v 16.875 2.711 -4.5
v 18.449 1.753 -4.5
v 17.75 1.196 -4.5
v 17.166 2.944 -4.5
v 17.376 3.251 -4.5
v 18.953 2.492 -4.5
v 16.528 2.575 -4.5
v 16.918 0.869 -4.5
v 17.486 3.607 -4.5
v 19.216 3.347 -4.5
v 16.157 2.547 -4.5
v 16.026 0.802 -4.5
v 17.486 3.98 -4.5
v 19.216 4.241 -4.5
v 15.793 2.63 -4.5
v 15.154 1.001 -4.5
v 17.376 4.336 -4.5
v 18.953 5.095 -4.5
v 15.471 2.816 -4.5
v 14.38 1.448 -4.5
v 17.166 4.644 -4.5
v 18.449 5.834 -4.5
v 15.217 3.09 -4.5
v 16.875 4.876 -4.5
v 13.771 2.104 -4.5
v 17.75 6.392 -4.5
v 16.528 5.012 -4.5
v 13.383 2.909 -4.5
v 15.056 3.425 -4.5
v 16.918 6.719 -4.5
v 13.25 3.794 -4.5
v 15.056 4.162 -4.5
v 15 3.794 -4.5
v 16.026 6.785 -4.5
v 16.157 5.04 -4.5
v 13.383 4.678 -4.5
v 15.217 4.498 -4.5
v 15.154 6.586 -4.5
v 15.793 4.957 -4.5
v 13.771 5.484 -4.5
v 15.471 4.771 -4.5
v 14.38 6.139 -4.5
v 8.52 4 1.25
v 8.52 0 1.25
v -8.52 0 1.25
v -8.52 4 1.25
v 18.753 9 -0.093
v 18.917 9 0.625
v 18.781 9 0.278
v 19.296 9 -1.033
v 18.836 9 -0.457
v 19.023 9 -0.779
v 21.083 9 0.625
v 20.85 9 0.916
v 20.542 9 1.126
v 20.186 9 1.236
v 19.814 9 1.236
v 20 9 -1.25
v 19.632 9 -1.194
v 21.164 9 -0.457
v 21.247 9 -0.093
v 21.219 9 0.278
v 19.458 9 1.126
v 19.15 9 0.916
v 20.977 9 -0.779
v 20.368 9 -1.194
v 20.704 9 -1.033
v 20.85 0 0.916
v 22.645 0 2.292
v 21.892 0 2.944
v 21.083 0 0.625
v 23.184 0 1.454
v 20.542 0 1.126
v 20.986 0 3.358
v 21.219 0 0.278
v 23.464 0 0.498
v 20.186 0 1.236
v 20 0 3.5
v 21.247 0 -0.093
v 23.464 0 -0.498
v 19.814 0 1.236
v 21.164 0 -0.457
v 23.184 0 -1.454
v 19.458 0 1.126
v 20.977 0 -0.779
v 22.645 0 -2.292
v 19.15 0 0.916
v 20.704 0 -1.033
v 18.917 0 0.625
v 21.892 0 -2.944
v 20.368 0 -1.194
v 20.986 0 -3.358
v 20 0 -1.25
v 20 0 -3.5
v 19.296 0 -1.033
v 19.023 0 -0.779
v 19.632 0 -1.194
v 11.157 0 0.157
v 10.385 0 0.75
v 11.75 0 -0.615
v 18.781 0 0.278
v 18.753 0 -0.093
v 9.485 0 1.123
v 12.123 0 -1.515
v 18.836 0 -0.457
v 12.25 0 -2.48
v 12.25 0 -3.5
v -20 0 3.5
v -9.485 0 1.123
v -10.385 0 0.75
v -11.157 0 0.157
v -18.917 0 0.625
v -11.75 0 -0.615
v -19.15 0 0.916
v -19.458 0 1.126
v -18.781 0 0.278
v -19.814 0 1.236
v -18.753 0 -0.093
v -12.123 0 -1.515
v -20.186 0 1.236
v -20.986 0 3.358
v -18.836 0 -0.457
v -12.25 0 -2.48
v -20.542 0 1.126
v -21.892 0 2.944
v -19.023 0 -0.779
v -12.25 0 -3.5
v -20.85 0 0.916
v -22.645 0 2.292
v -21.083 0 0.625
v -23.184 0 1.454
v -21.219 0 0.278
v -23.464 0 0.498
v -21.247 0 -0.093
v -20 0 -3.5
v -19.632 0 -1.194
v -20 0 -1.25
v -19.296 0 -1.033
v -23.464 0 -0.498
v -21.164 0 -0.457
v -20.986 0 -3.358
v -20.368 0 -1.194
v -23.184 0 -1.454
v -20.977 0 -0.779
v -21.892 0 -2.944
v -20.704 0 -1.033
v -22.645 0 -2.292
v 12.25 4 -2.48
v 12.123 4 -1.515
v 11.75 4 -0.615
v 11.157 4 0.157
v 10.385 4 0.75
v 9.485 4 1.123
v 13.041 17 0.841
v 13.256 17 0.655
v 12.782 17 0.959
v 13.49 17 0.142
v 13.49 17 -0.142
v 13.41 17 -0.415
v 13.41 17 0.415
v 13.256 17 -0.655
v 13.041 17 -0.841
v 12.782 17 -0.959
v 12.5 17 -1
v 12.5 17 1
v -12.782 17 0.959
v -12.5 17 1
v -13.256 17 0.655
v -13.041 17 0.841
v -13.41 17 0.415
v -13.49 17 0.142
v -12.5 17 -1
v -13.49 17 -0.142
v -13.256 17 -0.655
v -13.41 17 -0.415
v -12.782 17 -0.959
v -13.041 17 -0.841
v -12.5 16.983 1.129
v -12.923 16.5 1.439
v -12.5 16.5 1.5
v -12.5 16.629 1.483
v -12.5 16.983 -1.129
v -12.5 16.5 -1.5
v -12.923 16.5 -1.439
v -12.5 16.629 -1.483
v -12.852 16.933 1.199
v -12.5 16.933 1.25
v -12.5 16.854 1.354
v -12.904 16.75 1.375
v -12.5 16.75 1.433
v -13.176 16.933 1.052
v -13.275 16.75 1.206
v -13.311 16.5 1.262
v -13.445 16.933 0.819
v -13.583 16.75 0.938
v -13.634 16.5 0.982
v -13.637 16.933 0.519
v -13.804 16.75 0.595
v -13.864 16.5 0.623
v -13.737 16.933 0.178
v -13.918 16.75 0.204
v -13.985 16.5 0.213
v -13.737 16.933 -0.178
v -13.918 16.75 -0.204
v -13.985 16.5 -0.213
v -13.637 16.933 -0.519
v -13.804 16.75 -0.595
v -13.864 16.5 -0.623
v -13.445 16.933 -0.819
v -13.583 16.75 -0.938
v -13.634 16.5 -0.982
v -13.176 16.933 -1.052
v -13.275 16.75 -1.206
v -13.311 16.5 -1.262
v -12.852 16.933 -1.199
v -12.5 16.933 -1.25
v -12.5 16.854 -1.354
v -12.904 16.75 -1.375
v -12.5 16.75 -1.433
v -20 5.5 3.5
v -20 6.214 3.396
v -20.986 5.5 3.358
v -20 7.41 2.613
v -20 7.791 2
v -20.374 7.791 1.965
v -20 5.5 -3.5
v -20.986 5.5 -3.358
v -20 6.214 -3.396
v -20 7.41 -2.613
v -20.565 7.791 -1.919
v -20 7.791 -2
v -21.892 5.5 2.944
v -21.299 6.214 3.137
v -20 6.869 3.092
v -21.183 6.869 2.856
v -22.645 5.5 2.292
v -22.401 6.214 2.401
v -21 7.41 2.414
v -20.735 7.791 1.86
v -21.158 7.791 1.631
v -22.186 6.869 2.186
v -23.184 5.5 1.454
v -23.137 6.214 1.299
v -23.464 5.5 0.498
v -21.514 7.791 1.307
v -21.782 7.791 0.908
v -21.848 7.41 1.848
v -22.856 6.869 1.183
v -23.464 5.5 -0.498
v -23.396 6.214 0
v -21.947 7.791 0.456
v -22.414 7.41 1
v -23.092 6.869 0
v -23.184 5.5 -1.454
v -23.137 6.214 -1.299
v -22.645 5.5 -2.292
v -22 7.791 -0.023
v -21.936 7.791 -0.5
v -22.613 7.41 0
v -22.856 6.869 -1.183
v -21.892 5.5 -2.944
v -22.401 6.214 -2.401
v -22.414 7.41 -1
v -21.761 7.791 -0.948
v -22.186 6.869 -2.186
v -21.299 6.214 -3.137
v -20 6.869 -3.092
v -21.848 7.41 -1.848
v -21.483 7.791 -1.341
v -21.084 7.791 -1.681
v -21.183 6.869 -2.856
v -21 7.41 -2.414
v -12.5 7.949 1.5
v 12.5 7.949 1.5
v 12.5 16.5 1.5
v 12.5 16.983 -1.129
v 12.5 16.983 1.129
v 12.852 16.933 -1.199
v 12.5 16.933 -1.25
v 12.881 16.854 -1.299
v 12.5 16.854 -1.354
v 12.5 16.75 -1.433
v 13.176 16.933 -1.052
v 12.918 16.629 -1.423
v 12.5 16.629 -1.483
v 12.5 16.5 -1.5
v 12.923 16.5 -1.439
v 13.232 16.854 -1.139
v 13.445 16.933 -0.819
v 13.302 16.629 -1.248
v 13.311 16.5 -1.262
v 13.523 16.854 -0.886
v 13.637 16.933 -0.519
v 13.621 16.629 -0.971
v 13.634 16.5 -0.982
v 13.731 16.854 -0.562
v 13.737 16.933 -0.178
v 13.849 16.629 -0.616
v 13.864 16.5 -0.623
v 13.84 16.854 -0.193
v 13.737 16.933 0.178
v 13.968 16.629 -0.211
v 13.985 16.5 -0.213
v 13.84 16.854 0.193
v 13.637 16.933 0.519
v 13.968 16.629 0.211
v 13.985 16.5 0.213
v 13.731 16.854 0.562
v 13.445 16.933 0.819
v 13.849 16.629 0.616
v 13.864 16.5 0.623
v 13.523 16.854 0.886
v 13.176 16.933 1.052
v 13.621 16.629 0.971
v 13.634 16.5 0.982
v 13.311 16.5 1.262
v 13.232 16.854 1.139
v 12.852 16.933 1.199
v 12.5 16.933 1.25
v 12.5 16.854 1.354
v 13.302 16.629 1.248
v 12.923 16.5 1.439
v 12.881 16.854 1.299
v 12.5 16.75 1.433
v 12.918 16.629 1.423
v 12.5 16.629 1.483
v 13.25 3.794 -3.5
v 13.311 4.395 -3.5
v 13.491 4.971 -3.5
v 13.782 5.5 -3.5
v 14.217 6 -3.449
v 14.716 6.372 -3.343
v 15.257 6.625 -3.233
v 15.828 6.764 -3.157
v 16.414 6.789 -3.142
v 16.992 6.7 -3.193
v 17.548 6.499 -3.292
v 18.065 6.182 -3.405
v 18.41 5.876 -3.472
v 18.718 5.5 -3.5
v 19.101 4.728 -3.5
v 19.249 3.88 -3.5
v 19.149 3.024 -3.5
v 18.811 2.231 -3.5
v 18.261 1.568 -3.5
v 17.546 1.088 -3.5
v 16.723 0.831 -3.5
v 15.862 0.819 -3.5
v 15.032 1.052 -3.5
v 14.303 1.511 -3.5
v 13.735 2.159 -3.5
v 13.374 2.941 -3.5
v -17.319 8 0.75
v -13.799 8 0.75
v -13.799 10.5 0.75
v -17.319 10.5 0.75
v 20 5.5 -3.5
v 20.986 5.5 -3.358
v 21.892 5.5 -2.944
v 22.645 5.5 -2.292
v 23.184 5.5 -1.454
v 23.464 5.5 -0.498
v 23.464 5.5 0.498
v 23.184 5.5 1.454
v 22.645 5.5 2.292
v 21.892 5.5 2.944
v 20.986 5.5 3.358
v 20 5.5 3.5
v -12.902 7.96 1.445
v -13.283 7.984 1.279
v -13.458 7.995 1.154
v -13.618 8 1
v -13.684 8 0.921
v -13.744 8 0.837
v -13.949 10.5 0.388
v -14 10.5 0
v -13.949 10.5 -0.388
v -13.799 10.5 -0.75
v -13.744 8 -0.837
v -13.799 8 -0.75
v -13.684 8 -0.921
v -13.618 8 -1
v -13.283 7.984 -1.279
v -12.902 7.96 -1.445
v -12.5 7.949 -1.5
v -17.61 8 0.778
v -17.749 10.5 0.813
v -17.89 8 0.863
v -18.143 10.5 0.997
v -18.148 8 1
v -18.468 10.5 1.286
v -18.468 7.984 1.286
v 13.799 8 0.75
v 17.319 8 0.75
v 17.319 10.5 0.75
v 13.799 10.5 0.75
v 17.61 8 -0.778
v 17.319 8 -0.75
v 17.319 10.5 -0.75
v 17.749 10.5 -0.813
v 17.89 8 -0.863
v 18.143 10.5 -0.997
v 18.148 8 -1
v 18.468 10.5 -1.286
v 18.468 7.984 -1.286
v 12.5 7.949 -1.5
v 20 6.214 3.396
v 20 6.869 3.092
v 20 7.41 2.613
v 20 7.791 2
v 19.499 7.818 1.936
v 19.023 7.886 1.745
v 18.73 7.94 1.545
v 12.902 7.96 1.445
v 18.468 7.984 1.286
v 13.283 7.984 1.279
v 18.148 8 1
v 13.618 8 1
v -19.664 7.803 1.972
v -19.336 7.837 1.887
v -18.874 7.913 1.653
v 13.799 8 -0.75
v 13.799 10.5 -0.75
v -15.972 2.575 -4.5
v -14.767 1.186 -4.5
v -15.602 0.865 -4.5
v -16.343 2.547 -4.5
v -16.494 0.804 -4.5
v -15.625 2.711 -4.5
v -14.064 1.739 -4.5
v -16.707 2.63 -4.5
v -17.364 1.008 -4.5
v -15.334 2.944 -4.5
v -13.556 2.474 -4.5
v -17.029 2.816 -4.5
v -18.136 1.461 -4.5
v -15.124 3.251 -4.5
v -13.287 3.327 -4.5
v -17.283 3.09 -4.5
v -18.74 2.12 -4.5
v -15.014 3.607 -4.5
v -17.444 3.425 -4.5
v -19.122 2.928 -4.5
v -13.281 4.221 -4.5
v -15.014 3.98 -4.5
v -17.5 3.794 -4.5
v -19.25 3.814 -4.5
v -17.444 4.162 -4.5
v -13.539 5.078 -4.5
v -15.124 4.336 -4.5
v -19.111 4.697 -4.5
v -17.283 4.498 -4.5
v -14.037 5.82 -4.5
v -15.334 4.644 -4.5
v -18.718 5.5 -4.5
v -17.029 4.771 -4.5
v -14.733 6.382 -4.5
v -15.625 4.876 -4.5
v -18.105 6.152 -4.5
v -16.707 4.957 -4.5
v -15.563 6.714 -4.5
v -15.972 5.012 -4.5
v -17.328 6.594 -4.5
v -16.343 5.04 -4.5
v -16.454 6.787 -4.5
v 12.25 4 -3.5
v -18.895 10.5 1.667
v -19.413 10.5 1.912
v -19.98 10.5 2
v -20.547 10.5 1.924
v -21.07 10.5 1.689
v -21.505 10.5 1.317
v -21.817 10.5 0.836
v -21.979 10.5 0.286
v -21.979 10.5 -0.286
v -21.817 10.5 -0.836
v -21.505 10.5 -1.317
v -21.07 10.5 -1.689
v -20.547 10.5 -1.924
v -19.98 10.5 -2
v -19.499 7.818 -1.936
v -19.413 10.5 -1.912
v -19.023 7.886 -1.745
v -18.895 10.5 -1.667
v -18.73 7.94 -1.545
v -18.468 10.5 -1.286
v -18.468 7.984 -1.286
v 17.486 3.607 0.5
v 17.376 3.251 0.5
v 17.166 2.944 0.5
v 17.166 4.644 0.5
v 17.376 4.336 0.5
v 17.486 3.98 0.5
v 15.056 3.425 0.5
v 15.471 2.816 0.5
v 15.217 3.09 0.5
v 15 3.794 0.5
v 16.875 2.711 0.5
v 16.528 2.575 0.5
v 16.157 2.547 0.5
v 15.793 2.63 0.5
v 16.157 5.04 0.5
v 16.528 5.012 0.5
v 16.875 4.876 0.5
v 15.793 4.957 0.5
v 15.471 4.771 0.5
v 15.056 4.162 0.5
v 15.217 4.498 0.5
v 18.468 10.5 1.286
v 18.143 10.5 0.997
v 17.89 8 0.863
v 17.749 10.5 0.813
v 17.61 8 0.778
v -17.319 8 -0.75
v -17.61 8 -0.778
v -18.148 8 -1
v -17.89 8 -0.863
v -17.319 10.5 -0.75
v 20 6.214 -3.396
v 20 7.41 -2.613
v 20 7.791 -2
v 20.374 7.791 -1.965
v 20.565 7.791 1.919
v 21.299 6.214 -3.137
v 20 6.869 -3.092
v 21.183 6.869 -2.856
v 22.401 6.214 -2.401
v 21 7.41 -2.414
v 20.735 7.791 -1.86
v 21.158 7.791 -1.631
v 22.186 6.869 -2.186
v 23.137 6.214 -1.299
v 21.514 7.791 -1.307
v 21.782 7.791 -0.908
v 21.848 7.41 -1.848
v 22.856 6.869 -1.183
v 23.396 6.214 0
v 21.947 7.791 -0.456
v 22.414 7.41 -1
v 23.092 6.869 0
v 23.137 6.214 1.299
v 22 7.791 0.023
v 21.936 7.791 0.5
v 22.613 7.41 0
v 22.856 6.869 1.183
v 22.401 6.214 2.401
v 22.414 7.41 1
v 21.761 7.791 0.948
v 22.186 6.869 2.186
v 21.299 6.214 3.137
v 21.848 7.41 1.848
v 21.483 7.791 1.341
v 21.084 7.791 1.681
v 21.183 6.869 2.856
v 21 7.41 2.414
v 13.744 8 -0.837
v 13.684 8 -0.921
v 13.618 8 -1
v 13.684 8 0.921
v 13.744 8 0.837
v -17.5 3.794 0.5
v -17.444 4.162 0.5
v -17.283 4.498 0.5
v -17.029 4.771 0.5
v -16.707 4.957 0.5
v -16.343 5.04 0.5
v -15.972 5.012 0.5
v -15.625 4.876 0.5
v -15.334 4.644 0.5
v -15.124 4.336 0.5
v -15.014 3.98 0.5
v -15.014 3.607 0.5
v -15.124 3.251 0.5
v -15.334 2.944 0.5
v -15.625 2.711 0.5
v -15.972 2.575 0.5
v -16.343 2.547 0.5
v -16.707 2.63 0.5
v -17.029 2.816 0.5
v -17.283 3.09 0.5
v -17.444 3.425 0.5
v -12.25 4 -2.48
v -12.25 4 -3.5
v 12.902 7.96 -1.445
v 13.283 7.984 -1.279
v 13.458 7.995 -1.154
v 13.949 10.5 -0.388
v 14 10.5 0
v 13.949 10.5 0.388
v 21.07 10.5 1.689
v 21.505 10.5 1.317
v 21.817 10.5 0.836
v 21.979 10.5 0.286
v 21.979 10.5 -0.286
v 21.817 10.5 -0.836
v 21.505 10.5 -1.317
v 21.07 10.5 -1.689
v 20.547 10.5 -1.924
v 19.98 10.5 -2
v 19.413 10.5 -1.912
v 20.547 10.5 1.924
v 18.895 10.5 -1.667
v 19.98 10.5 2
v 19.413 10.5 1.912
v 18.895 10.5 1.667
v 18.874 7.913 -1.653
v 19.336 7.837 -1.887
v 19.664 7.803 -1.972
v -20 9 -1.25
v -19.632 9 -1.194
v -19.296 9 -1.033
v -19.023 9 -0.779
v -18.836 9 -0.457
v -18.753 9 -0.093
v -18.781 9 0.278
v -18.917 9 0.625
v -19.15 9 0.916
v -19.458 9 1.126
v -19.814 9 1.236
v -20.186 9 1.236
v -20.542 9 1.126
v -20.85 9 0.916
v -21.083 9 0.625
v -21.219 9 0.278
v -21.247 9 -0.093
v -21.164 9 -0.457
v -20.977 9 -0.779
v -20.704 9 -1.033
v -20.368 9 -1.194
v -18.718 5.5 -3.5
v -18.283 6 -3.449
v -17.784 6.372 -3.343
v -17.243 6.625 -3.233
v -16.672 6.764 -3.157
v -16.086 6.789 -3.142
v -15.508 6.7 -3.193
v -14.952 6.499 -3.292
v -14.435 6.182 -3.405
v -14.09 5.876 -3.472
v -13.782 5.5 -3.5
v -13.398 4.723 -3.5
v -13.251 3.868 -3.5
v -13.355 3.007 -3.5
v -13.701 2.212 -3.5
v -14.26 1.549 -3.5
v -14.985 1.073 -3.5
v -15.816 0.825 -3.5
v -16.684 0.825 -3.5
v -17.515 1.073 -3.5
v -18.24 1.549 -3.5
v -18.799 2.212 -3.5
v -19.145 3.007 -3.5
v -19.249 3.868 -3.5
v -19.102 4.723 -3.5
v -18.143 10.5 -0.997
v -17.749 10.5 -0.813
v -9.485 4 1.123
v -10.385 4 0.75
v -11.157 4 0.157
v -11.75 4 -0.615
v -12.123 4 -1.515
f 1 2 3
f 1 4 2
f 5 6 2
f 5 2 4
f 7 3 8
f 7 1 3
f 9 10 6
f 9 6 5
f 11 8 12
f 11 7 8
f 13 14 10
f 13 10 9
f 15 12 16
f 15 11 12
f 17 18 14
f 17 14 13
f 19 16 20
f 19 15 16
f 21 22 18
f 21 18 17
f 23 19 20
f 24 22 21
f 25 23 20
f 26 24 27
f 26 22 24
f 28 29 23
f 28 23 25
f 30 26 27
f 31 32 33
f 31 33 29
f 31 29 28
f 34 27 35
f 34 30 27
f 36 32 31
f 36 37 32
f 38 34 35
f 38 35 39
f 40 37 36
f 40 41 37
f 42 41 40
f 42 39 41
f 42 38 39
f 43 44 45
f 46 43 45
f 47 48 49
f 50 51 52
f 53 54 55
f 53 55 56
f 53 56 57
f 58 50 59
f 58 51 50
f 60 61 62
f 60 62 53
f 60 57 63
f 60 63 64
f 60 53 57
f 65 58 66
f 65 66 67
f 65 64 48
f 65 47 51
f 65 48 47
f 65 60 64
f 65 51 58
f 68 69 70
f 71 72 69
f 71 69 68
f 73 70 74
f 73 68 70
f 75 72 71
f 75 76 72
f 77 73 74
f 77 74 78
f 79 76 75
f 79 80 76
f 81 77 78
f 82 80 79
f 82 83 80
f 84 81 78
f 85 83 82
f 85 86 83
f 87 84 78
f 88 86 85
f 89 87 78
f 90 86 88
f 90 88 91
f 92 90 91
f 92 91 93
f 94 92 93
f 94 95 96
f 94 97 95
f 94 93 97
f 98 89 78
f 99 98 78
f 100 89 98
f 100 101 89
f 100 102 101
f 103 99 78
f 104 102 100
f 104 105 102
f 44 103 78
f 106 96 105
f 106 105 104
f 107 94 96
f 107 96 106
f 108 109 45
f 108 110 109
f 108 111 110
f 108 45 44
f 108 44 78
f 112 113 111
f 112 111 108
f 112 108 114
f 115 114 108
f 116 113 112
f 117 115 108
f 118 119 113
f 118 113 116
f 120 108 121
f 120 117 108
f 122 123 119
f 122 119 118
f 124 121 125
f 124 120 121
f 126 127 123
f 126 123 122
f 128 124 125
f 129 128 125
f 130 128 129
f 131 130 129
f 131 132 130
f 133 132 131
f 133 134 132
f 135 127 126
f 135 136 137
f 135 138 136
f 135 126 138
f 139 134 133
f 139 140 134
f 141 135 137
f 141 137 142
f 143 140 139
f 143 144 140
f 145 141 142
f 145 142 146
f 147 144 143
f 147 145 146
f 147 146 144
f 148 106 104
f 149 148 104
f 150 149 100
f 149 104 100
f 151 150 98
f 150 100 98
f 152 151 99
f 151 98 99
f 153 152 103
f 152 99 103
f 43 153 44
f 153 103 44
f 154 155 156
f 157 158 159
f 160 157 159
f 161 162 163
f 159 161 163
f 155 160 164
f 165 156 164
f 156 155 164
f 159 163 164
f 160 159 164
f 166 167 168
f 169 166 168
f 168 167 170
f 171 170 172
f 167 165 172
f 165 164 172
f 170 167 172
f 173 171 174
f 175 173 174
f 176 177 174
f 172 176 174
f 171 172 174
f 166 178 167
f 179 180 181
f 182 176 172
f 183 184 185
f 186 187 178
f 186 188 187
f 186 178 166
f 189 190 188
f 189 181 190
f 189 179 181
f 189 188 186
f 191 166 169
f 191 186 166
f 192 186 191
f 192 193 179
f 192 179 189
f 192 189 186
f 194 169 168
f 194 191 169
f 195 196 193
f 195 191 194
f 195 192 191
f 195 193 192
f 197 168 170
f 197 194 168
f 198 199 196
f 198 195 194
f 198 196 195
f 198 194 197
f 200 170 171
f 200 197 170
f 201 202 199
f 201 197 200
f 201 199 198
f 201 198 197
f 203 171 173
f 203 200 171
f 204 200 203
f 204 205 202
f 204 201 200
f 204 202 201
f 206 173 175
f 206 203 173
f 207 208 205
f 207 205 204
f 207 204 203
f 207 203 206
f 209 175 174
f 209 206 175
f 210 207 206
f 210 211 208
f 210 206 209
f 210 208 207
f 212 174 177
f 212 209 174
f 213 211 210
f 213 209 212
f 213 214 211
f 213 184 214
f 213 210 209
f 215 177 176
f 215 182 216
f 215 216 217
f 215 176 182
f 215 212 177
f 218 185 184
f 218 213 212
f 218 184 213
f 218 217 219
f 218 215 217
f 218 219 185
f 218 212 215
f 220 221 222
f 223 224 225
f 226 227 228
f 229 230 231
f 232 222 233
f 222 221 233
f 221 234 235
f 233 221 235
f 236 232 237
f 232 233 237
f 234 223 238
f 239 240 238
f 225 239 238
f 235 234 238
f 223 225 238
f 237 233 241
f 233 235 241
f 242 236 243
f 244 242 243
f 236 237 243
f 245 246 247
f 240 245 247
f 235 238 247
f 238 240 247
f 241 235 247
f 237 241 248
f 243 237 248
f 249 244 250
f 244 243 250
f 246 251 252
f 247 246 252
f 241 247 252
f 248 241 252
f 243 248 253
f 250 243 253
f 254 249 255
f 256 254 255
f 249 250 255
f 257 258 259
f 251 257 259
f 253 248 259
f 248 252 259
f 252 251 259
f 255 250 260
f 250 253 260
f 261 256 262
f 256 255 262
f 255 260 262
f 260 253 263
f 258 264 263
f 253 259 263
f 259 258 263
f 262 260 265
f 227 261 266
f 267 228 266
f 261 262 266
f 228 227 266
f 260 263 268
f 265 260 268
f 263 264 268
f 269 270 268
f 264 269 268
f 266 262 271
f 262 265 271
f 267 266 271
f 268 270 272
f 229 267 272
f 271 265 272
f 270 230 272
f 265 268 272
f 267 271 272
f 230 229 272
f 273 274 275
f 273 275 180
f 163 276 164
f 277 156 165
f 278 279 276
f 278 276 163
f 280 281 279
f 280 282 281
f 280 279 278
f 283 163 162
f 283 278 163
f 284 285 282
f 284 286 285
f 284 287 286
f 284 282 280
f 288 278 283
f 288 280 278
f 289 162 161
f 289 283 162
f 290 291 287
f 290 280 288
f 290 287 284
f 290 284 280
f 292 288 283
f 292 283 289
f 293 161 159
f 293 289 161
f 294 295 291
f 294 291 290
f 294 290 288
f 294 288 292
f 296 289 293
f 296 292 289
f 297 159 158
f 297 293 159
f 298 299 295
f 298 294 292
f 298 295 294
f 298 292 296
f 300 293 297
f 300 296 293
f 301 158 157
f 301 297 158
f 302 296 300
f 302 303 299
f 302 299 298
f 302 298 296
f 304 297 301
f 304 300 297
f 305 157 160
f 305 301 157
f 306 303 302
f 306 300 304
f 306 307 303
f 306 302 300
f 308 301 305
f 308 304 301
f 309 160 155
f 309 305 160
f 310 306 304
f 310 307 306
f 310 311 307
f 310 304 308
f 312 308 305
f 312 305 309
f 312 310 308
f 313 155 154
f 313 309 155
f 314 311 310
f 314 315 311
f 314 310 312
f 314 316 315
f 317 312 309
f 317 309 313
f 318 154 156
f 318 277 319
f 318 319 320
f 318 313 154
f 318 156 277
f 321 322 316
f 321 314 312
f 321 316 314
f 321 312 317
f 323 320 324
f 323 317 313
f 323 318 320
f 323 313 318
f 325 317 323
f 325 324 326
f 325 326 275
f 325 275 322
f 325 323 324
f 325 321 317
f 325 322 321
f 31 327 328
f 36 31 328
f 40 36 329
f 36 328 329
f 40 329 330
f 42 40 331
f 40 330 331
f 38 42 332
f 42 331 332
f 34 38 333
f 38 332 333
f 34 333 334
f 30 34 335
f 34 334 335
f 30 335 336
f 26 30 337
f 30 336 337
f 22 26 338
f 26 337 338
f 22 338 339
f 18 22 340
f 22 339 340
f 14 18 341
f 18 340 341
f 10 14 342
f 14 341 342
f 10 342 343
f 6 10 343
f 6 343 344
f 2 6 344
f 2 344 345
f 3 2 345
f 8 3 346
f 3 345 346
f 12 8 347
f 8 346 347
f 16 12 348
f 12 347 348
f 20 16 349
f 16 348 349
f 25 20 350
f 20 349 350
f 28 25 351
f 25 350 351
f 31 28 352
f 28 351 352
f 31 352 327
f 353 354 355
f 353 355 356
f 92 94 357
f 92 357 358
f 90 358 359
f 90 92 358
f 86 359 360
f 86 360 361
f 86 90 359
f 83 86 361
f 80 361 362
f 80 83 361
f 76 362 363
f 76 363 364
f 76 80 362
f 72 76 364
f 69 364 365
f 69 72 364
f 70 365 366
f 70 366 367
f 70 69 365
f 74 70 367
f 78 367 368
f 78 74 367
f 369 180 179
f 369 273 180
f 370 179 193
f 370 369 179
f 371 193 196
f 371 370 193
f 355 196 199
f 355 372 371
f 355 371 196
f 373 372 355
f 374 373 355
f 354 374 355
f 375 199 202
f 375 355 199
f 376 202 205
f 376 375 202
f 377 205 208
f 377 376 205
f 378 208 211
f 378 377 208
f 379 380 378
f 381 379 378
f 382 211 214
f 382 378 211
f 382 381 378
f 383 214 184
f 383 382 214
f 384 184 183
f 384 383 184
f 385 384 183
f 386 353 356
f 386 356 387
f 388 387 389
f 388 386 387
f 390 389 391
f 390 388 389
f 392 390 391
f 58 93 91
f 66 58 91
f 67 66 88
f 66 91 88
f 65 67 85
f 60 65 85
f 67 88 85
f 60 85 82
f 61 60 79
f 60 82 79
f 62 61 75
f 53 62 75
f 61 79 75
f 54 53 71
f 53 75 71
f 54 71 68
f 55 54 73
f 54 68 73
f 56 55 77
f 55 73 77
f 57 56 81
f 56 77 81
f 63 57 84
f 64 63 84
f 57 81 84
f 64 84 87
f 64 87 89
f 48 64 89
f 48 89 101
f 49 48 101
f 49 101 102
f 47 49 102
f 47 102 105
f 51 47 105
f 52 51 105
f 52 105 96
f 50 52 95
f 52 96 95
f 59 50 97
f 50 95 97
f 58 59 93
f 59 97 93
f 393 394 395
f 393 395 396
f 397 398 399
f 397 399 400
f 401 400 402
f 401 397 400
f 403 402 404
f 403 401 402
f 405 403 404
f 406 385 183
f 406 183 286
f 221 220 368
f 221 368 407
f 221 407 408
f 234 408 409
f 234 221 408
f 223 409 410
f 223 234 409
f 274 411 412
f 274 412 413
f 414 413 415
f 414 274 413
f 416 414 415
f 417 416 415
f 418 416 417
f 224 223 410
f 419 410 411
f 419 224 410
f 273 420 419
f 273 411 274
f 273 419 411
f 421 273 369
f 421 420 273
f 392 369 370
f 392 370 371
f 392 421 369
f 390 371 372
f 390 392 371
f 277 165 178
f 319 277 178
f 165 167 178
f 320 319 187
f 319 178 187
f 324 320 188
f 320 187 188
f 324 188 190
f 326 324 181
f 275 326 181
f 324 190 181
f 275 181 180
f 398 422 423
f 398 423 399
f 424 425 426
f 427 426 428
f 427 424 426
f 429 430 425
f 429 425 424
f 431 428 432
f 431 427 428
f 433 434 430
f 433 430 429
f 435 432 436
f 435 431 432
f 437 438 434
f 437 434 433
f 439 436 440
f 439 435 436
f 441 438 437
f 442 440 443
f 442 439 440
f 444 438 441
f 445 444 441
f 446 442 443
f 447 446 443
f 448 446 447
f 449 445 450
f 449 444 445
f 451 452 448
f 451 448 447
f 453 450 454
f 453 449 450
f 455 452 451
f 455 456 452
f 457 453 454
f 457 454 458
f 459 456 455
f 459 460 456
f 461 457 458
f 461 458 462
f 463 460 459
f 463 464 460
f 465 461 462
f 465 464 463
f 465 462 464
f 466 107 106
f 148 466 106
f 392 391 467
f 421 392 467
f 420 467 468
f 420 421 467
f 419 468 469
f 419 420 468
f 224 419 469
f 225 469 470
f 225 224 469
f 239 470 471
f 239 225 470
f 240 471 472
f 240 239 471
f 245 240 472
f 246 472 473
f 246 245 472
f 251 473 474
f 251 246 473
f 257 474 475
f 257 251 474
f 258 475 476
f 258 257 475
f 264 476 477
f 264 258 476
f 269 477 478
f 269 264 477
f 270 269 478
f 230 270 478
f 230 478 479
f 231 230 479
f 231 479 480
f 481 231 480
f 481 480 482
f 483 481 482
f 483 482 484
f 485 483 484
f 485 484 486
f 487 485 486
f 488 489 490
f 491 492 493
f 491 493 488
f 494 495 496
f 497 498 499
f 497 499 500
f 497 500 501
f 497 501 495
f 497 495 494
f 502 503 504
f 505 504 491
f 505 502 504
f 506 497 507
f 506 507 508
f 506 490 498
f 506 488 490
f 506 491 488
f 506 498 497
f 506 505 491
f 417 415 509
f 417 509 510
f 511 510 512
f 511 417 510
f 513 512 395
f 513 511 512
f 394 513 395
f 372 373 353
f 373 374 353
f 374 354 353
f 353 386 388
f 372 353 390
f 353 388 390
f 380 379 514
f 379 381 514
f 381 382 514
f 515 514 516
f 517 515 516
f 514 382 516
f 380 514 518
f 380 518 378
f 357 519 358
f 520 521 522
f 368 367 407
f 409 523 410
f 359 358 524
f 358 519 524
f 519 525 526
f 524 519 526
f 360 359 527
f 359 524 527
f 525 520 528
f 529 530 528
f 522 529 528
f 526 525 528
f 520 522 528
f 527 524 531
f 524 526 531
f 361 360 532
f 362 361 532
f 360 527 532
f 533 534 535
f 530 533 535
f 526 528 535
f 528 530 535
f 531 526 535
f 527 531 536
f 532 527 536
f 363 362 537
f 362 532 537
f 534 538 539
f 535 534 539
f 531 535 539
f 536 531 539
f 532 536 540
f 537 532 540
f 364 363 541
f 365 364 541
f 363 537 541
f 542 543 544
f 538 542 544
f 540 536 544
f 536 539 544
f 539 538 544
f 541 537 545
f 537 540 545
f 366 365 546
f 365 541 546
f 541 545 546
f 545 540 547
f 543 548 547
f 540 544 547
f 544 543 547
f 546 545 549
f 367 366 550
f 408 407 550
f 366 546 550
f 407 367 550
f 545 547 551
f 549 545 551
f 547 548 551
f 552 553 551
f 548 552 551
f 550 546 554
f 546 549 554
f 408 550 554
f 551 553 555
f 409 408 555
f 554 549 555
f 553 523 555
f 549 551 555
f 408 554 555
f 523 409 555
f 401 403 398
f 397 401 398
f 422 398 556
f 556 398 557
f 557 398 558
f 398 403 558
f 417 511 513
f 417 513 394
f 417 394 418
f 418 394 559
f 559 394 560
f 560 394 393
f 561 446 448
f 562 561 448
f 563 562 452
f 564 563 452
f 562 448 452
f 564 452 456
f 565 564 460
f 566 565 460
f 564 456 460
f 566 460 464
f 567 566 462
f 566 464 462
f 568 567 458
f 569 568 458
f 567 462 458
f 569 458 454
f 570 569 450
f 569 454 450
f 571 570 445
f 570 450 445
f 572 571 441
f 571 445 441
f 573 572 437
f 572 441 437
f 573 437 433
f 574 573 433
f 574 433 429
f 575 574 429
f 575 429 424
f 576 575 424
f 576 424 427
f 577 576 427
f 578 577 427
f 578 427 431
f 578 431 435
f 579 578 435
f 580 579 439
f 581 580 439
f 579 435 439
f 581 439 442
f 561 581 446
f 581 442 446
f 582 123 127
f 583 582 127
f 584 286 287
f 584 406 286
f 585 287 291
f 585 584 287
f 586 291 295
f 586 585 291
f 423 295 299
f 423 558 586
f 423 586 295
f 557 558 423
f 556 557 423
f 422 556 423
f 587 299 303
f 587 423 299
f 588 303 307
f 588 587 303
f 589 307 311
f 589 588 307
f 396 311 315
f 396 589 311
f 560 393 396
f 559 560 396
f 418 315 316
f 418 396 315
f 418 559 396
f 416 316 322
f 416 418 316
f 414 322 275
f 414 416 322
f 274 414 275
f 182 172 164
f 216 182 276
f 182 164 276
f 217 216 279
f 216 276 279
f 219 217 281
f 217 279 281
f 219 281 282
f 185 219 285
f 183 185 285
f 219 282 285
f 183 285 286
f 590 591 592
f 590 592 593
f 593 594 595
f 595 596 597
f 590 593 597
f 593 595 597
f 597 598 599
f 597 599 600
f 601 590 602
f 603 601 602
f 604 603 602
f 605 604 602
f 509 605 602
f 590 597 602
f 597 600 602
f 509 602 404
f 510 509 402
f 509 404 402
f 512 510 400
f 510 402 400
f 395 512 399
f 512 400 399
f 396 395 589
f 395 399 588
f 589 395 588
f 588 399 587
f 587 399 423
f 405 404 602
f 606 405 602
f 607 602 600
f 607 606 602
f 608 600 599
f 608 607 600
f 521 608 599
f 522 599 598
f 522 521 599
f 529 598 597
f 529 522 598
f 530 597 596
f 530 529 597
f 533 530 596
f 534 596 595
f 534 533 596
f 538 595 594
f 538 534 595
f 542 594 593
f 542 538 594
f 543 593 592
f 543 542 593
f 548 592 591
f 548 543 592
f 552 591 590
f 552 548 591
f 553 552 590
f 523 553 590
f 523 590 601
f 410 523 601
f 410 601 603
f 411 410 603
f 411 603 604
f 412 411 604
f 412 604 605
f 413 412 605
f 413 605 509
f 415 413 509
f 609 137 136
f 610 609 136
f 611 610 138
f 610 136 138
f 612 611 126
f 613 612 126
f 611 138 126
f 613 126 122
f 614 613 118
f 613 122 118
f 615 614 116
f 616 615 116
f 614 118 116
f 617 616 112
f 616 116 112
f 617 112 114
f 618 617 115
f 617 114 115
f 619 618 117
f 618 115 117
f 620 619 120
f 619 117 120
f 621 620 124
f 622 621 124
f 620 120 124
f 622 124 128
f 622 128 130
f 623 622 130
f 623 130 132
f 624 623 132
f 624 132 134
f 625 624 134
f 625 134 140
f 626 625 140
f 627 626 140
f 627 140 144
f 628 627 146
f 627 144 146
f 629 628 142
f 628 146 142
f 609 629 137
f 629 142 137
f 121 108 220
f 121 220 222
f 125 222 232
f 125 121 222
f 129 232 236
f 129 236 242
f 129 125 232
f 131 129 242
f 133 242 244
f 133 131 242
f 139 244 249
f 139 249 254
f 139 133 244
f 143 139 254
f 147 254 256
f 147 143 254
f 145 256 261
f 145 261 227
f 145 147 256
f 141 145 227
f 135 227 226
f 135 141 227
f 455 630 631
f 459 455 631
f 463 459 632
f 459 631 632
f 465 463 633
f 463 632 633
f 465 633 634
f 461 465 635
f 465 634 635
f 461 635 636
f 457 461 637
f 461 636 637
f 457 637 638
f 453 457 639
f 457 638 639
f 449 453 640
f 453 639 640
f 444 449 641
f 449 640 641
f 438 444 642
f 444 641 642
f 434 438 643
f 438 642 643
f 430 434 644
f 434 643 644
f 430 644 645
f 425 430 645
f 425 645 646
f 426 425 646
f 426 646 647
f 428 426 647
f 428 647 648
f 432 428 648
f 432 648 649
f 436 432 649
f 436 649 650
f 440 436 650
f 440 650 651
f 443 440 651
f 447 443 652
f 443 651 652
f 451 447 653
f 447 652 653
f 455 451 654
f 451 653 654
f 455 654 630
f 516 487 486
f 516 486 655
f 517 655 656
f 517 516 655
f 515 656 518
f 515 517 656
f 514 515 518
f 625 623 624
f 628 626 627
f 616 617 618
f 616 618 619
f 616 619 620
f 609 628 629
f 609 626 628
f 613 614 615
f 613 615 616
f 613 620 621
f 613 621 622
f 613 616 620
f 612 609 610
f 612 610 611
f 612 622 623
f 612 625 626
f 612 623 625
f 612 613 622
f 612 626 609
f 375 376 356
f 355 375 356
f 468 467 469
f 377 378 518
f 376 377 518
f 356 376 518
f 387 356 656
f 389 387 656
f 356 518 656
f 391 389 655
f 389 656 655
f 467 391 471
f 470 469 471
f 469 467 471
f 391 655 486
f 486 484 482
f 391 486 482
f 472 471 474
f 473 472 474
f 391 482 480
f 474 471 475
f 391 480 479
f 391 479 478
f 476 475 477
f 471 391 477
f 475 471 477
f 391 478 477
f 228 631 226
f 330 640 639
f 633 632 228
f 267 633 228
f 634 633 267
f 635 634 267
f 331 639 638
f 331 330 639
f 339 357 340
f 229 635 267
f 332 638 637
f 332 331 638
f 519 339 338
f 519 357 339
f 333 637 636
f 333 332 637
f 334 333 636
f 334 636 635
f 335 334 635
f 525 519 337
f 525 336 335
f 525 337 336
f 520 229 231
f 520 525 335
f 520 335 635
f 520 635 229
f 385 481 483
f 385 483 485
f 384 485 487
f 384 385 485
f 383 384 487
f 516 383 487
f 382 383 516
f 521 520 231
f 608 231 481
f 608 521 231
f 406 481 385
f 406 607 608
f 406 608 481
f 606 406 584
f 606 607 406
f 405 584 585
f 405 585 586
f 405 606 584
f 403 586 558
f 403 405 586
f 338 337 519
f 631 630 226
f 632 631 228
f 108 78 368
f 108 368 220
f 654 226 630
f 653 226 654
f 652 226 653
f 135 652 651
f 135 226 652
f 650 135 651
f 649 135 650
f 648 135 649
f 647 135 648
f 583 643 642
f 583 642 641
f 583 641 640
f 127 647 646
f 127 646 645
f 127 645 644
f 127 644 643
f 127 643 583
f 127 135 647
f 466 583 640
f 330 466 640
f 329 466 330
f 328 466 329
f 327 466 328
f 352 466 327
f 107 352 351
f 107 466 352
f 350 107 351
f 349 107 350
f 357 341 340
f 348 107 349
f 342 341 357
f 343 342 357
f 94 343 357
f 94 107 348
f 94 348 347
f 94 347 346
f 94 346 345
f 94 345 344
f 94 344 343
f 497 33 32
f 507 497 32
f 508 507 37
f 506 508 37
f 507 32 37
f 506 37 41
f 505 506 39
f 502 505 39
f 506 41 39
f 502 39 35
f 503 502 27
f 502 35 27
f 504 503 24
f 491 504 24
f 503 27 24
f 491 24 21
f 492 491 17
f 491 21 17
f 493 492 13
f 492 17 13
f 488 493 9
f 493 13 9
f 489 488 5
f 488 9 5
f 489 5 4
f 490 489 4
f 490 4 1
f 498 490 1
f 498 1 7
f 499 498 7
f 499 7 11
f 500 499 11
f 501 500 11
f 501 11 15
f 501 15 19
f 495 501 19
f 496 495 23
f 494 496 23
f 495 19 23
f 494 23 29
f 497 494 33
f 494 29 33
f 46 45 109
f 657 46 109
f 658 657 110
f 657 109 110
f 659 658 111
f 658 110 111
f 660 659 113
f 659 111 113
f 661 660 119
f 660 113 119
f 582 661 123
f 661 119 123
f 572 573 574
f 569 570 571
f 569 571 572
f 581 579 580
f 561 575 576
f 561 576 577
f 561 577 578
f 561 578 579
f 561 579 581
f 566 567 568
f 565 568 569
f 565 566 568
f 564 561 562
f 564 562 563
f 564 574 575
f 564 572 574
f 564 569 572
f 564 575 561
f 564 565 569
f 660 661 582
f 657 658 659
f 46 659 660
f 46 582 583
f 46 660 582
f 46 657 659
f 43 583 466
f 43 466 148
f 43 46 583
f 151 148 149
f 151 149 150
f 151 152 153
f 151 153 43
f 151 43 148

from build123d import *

# Parameters (mm, degrees)
BOSS_EXTRUDE1_DEPTH      = 8
FILLET1_R                = 2.5
BOSS_EXTRUDE2_DEPTH      = 9
BOSS_EXTRUDE2_DEPTH_BACK = 1
FILLET2_R                = 0.5
BOSS_EXTRUDE3_DEPTH      = 2.5
BOSS_EXTRUDE3_DEPTH_BACK = 1
SKETCH4_R                = 1.25
CUT_EXTRUDE1_DEPTH       = 9
CUT_EXTRUDE2_DEPTH       = 4
BOSS_EXTRUDE4_DEPTH      = 1
BOSS_EXTRUDE4_DEPTH_BACK = 1
SKETCH6_R                = 3
SKETCH7_R                = 1.25
CUT_EXTRUDE3_DEPTH       = 5


with BuildPart() as part:
    # Sketch1 → Boss-Extrude1 (new body)
    with BuildSketch(Plane(origin=(0, 0, 0), x_dir=(1, 0, 0), z_dir=(0, 1, 0))):
        with BuildLine():
            Line((-20, 3.5), (20, 3.5))
            ThreePointArc((20, 3.5), (23.5, 0), (20, -3.5))
            Line((20, -3.5), (-20, -3.5))
            ThreePointArc((-20, -3.5), (-23.5, 0), (-20, 3.5))
        make_face()
    extrude(amount=BOSS_EXTRUDE1_DEPTH)

    # Fillet1
    fillet1_edges = [part.edges().sort_by_distance(p)[0] for p in [
        (23.5, 8, 0),
        (0, 8, -3.5),
        (-23.5, 8, 0),
        (0, 8, 3.5),
    ]]
    fillet(fillet1_edges, radius=FILLET1_R)

    # Sketch2 → Boss-Extrude2 (add, two sides: drawn at the far end of the back side and taken through both)
    with BuildSketch(Plane(origin=(0, 8, 0), x_dir=(1, 0, 0), z_dir=(0, 1, 0)).offset(-BOSS_EXTRUDE2_DEPTH_BACK)):
        with BuildLine():
            Line((-12.5, 1.5), (12.5, 1.5))
            ThreePointArc((12.5, 1.5), (14, 0), (12.5, -1.5))
            Line((12.5, -1.5), (-12.5, -1.5))
            ThreePointArc((-12.5, -1.5), (-14, 0), (-12.5, 1.5))
        make_face()
    extrude(amount=BOSS_EXTRUDE2_DEPTH + BOSS_EXTRUDE2_DEPTH_BACK)

    # Fillet2
    fillet2_edges = [part.edges().sort_by_distance(p)[0] for p in [
        (-14, 17, 0),
        (0, 17, 1.5),
        (14, 17, 0),
        (0, 17, -1.5),
    ]]
    fillet(fillet2_edges, radius=FILLET2_R)

    # Sketch3 → Boss-Extrude3 (add, two sides: drawn at the far end of the back side and taken through both)
    with BuildSketch(Plane(origin=(0, 8, 0), x_dir=(1, 0, 0), z_dir=(0, 1, 0)).offset(-BOSS_EXTRUDE3_DEPTH_BACK)):
        with BuildLine():
            Line((-17.319048676, 0.75), (-13.799038106, 0.75))
            ThreePointArc((-13.799038106, 0.75), (-14, 0), (-13.799038106, -0.75))
            Line((-13.799038106, -0.75), (-17.319048676, -0.75))
            ThreePointArc((-17.319048676, -0.75), (-17.952914367, -0.890509549), (-18.468027815, -1.285714286))
            ThreePointArc((-18.468027815, -1.285714286), (-22, 0), (-18.468027815, 1.285714286))
            ThreePointArc((-18.468027815, 1.285714286), (-17.952914367, 0.890509549), (-17.319048676, 0.75))
        make_face()
        with BuildLine():
            Line((17.319048676, -0.75), (13.799038106, -0.75))
            ThreePointArc((13.799038106, -0.75), (14, 0), (13.799038106, 0.75))
            Line((13.799038106, 0.75), (17.319048676, 0.75))
            ThreePointArc((17.319048676, 0.75), (17.952914367, 0.890509549), (18.468027815, 1.285714286))
            ThreePointArc((18.468027815, 1.285714286), (22, 0), (18.468027815, -1.285714286))
            ThreePointArc((18.468027815, -1.285714286), (17.952914367, -0.890509549), (17.319048676, -0.75))
        make_face()
    extrude(amount=BOSS_EXTRUDE3_DEPTH + BOSS_EXTRUDE3_DEPTH_BACK)

    # Sketch4 → Cut-Extrude1 (cut)
    with BuildSketch(Plane.XZ):
        with Locations(Location((20, 0, 0), (0, 0, 270))):
            Circle(SKETCH4_R)
        with Locations(Location((-20, 0, 0), (0, 0, 270))):
            Circle(SKETCH4_R)
    extrude(amount=-CUT_EXTRUDE1_DEPTH, mode=Mode.SUBTRACT)

    # Sketch5 → Cut-Extrude2 (cut)
    with BuildSketch(Plane.XZ):
        with BuildLine():
            Line((8.51994599, 1.25), (-8.51994599, 1.25))
            ThreePointArc((-8.51994599, 1.25), (-11.157492475, 0.157492475), (-12.25, -2.48005401))
            Line((-12.25, -2.48005401), (-12.25, -3.5))
            Line((-12.25, -3.5), (12.25, -3.5))
            Line((12.25, -3.5), (12.25, -2.48005401))
            ThreePointArc((12.25, -2.48005401), (11.157492475, 0.157492475), (8.51994599, 1.25))
        make_face()
    extrude(amount=-CUT_EXTRUDE2_DEPTH, mode=Mode.SUBTRACT)

    # Sketch6 → Boss-Extrude4 (add, two sides: drawn at the far end of the back side and taken through both)
    with BuildSketch(Plane(origin=(0, 0, -3.5), x_dir=(-1, 0, 0), z_dir=(0, 0, -1)).offset(-BOSS_EXTRUDE4_DEPTH_BACK)):
        with Locations((-16.25, 3.79375)):
            Circle(SKETCH6_R)
        with Locations(Location((16.25, 3.79375, 0), (0, 0, 34.663105373))):
            Circle(SKETCH6_R)
    extrude(amount=BOSS_EXTRUDE4_DEPTH + BOSS_EXTRUDE4_DEPTH_BACK)

    # Sketch7 → Cut-Extrude3 (cut)
    with BuildSketch(Plane(origin=(0, 0, -4.5), x_dir=(-1, 0, 0), z_dir=(0, 0, -1))):
        with Locations((-16.25, 3.79375)):
            Circle(SKETCH7_R)
        with Locations((16.25, 3.79375)):
            Circle(SKETCH7_R)
    extrude(amount=-CUT_EXTRUDE3_DEPTH, mode=Mode.SUBTRACT)


solid = part.part
